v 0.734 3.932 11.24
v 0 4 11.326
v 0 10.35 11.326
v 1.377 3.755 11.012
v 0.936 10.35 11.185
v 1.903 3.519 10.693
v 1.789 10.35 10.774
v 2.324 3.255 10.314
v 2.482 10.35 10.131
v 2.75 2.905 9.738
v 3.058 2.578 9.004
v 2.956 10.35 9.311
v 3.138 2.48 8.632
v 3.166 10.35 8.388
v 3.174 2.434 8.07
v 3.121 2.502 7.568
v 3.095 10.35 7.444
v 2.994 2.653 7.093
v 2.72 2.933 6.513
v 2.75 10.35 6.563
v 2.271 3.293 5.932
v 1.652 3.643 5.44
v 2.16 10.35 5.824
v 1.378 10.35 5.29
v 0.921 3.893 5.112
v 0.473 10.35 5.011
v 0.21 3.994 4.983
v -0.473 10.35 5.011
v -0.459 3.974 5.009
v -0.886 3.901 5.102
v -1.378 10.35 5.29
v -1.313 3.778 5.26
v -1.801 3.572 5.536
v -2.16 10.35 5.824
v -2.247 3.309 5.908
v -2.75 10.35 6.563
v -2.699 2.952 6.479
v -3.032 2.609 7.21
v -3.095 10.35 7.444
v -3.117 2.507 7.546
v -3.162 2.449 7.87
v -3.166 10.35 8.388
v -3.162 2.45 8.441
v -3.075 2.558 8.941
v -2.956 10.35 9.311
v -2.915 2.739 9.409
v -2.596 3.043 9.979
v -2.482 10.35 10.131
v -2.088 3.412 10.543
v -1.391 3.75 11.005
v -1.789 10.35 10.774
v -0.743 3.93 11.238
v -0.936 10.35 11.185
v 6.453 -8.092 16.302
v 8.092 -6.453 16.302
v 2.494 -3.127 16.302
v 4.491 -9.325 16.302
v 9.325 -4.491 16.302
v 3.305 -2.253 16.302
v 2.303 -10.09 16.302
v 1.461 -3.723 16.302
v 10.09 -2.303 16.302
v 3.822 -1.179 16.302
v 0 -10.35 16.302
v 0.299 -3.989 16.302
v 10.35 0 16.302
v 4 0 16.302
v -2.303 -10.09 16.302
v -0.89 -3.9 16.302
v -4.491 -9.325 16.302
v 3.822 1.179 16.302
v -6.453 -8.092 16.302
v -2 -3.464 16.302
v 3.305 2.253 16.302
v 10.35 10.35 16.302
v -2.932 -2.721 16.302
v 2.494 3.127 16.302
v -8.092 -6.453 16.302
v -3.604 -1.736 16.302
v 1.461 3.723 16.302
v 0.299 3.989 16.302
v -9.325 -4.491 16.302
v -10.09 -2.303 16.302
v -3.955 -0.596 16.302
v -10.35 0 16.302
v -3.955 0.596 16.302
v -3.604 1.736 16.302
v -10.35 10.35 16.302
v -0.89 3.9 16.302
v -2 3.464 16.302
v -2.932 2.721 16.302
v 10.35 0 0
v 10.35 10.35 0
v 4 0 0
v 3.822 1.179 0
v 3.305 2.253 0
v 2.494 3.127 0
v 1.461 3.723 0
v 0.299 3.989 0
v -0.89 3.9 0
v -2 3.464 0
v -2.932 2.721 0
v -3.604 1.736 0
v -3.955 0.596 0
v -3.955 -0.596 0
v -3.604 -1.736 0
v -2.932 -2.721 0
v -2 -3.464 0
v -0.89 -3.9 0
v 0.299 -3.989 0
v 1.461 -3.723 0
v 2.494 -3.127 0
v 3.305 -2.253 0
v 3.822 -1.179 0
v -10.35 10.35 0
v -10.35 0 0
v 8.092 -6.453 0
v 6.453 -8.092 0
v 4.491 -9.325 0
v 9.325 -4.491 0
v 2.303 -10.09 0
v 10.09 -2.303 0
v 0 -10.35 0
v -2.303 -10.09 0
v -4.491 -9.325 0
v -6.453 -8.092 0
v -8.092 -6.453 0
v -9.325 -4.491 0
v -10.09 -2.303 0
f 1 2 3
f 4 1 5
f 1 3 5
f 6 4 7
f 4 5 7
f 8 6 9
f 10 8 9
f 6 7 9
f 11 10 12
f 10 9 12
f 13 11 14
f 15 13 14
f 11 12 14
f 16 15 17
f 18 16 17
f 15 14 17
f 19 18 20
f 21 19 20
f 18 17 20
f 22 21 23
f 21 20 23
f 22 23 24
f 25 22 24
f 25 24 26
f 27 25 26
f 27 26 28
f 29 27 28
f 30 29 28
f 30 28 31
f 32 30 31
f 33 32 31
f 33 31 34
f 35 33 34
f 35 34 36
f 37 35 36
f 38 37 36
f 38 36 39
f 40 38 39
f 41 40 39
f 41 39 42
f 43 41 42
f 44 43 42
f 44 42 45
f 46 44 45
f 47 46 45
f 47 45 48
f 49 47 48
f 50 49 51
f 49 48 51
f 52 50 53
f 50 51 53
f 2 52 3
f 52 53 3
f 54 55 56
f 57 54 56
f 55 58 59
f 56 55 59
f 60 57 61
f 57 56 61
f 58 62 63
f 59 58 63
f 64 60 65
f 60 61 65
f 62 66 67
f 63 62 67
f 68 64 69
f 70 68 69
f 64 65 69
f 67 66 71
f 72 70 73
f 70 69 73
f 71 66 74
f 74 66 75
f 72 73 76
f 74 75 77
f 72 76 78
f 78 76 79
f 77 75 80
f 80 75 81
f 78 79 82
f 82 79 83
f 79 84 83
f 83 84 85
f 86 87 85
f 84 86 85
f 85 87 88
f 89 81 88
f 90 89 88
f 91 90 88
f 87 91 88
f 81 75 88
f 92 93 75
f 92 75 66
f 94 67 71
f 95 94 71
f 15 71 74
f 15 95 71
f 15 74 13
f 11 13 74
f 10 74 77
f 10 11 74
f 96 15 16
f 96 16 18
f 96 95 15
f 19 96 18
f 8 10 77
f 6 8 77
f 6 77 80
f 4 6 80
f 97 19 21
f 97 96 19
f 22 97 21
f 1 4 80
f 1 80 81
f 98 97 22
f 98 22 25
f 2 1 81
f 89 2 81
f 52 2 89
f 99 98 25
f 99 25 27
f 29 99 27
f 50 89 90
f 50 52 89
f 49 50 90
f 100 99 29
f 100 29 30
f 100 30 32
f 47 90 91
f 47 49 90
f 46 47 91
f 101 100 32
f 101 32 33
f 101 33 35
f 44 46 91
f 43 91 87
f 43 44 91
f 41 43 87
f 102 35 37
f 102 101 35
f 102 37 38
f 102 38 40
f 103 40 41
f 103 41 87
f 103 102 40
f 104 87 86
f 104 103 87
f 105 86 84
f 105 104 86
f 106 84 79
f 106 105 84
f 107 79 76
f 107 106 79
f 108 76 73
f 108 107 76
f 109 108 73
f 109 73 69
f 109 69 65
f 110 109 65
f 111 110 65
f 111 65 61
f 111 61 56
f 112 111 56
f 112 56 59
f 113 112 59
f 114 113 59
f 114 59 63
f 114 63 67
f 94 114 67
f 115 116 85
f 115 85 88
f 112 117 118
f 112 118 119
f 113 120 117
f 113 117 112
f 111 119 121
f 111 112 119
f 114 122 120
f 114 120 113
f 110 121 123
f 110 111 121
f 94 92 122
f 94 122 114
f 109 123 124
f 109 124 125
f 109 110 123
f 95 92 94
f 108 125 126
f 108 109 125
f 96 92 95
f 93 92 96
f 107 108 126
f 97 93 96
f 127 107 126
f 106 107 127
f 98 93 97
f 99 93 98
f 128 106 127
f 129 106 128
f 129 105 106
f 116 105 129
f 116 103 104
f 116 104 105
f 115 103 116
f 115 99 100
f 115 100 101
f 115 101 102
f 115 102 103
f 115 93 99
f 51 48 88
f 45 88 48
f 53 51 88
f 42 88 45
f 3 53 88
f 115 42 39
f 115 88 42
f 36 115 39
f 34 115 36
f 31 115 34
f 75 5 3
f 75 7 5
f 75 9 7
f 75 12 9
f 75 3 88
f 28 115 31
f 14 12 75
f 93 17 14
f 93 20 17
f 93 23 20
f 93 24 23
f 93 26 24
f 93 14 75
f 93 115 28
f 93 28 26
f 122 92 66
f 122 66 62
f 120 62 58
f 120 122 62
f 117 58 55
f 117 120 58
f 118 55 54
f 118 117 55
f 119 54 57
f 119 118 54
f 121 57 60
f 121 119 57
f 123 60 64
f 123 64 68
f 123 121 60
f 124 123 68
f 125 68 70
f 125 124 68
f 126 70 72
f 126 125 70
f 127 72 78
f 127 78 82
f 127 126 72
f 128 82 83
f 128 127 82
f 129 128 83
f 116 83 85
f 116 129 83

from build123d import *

# Parameters (mm, degrees)
SKETCH2_R               = 3.999992
BOSS_EXTRUDE1_DEPTH     = 16.301974
CUT_EXTRUDE1_REACH      = 30.308
CUT_EXTRUDE1_END_RADIUS = 3.999992
SKETCH3_R               = 3.175


with BuildPart() as part:
    # Sketch2 → Boss-Extrude1 (new body)
    with BuildSketch(Plane.XY):
        with BuildLine():
            Line((-10.349992, 0), (-10.349992, 10.349992))
            Line((-10.349992, 10.349992), (0, 10.349992))
            Line((0, 10.349992), (10.349992, 10.349992))
            Line((10.349992, 10.349992), (10.349992, 0))
            ThreePointArc((10.349992, 0), (0, -10.349992), (-10.349992, 0))
        make_face()
        Circle(SKETCH2_R, mode=Mode.SUBTRACT)
    extrude(amount=BOSS_EXTRUDE1_DEPTH)

    # Cut-Extrude1: up to this cylinder (the profile starts outside it)
    cut_extrude1_end = Plane(origin=(0, 0, 8.150987), z_dir=(0, 0, -1)) * Cylinder(CUT_EXTRUDE1_END_RADIUS, 69.615984, mode=Mode.PRIVATE)
    # Sketch3 → Cut-Extrude1 (cut, up to the surface)
    with BuildSketch(Plane(origin=(0, 10.349992, 0), x_dir=(1, 0, 0), z_dir=(0, 1, 0)), mode=Mode.PRIVATE) as cut_extrude1_sk1:
        with Locations(Location((0, -8.150987, 0), (0, 0, 270))):
            Circle(SKETCH3_R)
    cut_extrude1_tool1 = extrude(cut_extrude1_sk1.sketch, amount=-CUT_EXTRUDE1_REACH, mode=Mode.PRIVATE) - cut_extrude1_end
    add(cut_extrude1_tool1.solids().sort_by_distance((0, 10.349992, 8.150987))[0], mode=Mode.SUBTRACT)


solid = part.part
